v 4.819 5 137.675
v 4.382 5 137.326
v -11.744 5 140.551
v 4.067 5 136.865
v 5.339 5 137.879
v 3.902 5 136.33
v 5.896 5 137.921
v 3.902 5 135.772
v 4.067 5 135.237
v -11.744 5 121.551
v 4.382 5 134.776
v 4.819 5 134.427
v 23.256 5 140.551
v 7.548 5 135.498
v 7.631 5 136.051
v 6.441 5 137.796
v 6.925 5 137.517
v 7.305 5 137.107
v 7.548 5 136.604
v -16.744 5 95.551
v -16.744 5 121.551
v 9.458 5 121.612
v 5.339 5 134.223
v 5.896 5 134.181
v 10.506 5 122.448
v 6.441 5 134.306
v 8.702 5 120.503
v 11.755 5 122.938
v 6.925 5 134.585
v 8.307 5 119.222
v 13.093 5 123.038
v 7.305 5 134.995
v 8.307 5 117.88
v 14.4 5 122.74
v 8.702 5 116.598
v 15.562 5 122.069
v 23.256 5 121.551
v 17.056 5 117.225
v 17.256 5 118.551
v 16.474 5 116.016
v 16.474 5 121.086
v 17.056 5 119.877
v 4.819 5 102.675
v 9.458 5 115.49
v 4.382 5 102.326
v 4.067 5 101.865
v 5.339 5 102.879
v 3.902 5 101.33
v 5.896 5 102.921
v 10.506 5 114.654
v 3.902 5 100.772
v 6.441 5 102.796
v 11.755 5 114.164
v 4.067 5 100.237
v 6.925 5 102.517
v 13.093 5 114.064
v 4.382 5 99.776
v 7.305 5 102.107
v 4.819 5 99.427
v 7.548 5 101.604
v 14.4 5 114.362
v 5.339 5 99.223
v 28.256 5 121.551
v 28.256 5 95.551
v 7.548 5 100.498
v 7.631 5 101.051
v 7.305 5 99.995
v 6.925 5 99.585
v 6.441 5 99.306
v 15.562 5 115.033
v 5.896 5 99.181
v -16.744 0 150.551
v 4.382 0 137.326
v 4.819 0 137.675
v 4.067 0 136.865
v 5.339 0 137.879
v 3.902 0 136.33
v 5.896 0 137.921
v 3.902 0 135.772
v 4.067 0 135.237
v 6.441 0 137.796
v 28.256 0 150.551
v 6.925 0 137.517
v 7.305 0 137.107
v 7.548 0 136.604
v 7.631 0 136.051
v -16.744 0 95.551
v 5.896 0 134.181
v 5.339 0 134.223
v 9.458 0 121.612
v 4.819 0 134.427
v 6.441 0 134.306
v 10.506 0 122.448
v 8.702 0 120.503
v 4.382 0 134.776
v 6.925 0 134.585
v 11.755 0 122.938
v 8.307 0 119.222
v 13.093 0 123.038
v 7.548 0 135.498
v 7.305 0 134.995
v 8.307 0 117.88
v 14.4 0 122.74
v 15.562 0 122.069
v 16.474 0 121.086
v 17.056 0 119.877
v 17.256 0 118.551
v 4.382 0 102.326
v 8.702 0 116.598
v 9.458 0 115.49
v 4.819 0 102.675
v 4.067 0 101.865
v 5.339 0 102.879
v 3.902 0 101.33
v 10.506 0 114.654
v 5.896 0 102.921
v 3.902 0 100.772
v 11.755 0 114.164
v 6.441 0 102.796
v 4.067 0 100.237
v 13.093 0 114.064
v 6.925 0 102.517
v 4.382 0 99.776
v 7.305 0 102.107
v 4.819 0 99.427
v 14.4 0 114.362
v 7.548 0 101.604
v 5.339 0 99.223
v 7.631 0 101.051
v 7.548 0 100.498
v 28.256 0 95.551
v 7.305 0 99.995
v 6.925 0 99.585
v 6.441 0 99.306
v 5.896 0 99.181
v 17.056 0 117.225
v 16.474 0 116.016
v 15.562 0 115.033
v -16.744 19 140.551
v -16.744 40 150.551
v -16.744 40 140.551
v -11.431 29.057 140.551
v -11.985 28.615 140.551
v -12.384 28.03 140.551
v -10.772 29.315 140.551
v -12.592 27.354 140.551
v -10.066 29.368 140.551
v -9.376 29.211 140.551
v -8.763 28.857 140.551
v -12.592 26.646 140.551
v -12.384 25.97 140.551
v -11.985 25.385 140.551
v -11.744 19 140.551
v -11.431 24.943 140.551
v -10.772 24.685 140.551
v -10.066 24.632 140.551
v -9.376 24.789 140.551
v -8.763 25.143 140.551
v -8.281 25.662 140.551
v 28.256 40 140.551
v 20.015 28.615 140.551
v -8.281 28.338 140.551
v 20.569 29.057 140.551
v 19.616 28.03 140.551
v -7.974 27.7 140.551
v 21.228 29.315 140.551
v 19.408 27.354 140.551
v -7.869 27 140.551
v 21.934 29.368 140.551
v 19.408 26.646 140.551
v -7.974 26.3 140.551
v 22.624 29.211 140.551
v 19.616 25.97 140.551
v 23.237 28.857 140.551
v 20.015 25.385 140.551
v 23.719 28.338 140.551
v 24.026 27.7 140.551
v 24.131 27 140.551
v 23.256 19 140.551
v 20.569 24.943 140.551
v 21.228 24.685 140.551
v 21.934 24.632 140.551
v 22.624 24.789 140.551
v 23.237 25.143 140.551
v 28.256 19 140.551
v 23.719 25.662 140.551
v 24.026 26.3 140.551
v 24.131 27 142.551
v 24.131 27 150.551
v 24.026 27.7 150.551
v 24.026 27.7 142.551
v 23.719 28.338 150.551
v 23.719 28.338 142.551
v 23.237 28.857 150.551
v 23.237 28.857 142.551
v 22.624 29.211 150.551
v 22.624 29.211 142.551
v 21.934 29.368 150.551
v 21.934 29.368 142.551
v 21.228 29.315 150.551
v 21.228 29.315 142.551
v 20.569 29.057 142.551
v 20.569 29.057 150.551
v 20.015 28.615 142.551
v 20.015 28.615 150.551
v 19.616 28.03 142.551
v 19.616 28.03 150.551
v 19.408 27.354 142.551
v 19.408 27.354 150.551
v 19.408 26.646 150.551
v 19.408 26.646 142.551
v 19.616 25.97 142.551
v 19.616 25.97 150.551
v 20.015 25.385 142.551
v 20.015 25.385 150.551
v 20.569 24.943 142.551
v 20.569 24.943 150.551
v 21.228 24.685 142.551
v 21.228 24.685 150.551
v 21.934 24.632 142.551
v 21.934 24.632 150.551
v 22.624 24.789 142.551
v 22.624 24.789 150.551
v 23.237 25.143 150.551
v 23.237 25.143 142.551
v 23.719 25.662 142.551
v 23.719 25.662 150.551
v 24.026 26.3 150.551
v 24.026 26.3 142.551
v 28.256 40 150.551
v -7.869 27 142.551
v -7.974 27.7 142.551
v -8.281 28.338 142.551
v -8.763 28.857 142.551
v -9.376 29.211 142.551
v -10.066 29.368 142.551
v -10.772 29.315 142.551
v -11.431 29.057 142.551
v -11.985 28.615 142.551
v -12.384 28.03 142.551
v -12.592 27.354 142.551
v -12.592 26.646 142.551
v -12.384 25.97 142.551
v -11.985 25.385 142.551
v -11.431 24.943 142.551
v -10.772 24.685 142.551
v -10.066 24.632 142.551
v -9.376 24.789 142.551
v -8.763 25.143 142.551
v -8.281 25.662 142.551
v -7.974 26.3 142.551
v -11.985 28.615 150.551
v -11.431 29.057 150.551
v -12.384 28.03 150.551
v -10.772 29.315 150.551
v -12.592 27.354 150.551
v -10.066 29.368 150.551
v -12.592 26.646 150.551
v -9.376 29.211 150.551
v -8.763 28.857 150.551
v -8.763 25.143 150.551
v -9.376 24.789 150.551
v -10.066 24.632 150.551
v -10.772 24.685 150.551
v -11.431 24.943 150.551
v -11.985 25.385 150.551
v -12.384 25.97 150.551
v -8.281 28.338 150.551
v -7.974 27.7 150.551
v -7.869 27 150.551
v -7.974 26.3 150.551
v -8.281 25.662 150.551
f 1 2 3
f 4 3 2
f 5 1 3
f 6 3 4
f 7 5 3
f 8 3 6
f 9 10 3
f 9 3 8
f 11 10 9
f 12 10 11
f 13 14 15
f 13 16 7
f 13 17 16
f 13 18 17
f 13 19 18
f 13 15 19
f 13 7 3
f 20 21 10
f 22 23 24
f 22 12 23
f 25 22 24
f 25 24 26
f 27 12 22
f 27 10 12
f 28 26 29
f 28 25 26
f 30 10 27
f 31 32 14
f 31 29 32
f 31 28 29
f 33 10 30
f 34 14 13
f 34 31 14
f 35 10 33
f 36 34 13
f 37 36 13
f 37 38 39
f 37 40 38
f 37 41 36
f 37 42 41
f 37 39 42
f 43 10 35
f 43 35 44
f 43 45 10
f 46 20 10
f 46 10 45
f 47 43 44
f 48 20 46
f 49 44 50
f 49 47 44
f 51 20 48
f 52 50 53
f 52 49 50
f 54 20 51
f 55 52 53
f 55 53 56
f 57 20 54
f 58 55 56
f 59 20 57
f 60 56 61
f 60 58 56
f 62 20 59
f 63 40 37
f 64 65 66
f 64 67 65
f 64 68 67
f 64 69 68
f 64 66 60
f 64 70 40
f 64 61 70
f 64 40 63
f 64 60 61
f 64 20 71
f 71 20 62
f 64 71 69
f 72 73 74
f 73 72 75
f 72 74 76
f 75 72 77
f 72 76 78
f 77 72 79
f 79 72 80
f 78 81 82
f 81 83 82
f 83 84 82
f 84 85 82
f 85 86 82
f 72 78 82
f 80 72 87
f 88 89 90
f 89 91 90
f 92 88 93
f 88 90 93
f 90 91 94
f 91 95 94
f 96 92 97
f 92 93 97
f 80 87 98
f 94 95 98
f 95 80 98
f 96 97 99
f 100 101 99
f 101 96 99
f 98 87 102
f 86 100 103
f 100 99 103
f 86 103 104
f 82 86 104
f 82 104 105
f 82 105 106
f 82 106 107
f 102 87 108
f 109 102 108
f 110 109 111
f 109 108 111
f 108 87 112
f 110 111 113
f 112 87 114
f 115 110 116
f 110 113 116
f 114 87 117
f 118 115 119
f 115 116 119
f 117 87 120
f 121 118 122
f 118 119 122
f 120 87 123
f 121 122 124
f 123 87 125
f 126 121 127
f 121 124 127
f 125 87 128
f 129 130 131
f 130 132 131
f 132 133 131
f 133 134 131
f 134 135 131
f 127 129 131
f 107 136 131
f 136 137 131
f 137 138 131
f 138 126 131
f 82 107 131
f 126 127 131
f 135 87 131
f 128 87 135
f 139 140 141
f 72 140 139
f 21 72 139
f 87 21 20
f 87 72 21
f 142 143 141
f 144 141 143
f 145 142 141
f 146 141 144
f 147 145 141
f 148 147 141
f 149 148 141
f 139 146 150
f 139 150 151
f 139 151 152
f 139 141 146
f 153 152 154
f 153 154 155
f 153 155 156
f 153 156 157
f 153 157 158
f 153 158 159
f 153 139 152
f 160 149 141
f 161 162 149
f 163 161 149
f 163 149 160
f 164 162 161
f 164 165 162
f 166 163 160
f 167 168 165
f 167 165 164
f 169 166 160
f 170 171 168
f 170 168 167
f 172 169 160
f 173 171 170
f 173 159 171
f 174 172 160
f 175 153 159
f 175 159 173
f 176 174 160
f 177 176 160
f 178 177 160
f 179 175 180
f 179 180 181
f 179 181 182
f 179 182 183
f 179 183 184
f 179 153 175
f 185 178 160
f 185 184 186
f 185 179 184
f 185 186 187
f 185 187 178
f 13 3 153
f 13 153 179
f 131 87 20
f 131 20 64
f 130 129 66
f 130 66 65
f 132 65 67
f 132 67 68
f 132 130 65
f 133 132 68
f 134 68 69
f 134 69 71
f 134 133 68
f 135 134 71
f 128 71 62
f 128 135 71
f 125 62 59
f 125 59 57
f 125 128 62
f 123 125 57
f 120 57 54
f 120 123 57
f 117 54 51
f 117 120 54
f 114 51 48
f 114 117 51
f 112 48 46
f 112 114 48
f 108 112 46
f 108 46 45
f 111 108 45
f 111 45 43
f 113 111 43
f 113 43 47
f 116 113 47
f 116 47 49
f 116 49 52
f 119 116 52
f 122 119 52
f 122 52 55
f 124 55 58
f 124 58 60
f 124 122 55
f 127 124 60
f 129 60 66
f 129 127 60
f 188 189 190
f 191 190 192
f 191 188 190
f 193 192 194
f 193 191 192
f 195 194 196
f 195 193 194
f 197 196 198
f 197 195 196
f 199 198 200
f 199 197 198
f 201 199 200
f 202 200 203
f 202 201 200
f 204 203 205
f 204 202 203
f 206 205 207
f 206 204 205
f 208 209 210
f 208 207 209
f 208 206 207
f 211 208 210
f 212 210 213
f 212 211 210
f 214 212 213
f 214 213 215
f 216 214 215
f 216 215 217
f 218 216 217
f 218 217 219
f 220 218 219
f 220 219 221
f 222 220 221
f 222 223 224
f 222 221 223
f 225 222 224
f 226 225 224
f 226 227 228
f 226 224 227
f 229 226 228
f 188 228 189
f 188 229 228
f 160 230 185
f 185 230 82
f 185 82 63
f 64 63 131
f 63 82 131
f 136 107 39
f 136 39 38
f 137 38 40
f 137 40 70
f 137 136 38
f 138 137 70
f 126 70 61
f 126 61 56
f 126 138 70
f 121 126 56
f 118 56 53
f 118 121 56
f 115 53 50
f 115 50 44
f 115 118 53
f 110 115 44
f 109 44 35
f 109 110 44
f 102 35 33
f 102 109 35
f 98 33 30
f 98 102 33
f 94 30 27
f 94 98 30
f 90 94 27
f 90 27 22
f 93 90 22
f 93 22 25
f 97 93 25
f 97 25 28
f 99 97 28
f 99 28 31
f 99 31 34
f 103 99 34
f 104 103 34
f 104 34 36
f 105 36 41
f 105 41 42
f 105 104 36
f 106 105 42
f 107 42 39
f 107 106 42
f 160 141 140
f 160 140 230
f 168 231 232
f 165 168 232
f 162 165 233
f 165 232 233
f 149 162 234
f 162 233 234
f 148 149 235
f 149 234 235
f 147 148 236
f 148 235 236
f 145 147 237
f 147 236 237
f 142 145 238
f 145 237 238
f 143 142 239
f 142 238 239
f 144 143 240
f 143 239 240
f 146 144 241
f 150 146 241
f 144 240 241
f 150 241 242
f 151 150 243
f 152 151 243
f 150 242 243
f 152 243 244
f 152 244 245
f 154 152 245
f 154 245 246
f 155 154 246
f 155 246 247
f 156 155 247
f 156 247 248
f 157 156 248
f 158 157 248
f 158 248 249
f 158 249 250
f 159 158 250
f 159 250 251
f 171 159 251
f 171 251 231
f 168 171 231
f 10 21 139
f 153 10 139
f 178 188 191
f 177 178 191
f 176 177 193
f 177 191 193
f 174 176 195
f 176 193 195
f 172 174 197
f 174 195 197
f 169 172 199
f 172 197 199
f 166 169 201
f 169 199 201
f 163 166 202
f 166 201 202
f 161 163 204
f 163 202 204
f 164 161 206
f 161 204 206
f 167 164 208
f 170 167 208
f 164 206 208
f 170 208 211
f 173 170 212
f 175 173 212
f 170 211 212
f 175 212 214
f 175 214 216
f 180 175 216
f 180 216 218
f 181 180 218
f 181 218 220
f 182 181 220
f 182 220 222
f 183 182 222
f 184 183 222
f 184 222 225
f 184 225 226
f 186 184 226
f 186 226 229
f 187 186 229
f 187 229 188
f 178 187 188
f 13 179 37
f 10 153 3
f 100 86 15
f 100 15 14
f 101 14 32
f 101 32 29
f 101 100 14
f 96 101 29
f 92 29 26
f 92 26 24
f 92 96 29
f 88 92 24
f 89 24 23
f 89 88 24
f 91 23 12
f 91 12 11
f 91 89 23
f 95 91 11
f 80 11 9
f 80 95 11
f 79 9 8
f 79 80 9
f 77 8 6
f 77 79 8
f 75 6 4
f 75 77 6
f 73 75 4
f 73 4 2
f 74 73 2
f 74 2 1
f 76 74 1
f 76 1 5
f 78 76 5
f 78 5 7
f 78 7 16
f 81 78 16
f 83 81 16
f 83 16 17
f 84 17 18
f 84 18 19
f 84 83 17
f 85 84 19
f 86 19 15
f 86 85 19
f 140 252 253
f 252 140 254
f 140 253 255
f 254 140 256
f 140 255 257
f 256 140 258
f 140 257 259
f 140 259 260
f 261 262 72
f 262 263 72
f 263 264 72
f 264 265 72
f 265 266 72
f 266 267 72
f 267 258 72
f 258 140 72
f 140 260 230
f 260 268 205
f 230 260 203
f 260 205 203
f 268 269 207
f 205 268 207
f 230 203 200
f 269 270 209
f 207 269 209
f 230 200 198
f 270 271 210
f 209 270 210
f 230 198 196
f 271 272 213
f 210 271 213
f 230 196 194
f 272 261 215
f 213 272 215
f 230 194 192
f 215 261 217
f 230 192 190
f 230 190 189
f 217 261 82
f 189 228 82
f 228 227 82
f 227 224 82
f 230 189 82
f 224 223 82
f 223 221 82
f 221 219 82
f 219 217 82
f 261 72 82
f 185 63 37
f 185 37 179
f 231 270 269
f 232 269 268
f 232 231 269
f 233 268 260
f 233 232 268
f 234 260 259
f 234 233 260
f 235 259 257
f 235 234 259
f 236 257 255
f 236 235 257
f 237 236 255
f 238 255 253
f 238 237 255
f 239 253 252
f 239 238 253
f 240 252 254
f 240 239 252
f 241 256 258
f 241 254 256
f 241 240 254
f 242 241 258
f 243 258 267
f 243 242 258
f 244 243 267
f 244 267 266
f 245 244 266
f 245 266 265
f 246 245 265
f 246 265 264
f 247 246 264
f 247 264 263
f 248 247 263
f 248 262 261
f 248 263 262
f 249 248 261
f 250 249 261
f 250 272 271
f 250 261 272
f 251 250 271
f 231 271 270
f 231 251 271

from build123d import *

# Parameters (mm, degrees)
SKETCH7_W               = 45
SKETCH7_H               = 45
SKETCH7_R               = 1.875
SKETCH7_R_2             = 14
SKETCH7_R_3             = 4.5
BOSS_EXTRUDE5_DEPTH     = 5
SKETCH7_3_W             = 45
SKETCH7_3_H             = 2
BOSS_EXTRUDE6_DEPTH     = 40
BOSS_EXTRUDE7_DEPTH     = 5
SKETCH7_4_W             = 45
SKETCH7_4_H             = 8
BOSS_EXTRUDE8_DEPTH     = 40
SKETCH10_R              = 2.375
CUT_EXTRUDE2_DEPTH      = 9
CUT_EXTRUDE2_DEPTH_BACK = 5


with BuildPart() as part:
    # Sketch7 → Boss-Extrude5 (new body)
    with BuildSketch(Plane(origin=(0, 0, 0), x_dir=(1, 0, 0), z_dir=(0, 1, 0))):
        with Locations((5.756289545, -118.050969126)):
            Rectangle(SKETCH7_W, SKETCH7_H)
        with Locations((5.756289545, -136.050969126)):
            Circle(SKETCH7_R, mode=Mode.SUBTRACT)
        with Locations((5.362034713, -118.985312035)):
            Circle(SKETCH7_R_2, mode=Mode.SUBTRACT)
        with Locations((5.756289545, -101.050969126)):
            Circle(SKETCH7_R, mode=Mode.SUBTRACT)
        with Locations((5.362034713, -118.985312035)):
            Circle(SKETCH7_R_2)
        with Locations((12.756289545, -118.550969126)):
            Circle(SKETCH7_R_3, mode=Mode.SUBTRACT)
    extrude(amount=BOSS_EXTRUDE5_DEPTH)

    # Sketch7<3> → Boss-Extrude6 (add)
    with BuildSketch(Plane(origin=(0, 0, 0), x_dir=(1, 0, 0), z_dir=(0, 1, 0))):
        with Locations((5.756289545, -141.550969126)):
            Rectangle(SKETCH7_3_W, SKETCH7_3_H)
    extrude(amount=BOSS_EXTRUDE6_DEPTH)

    # Sketch8 → Boss-Extrude7 (add)
    with BuildSketch(Plane.ZY.offset(16.743710455)):
        Polygon((140.550969126, 11), (140.550969126, 5), (121.550969126, 5), (140.550969126, 19), align=None)
    boss_extrude7 = extrude(amount=-BOSS_EXTRUDE7_DEPTH)

    # Mirror2: Boss-Extrude7 across plane
    add(boss_extrude7.mirror(Plane.ZY.offset(-5.756289545)))

    # Sketch7<4> → Boss-Extrude8 (add)
    with BuildSketch(Plane(origin=(0, 0, 0), x_dir=(1, 0, 0), z_dir=(0, 1, 0))):
        with Locations((5.756289545, -146.550969126)):
            Rectangle(SKETCH7_4_W, SKETCH7_4_H)
    extrude(amount=BOSS_EXTRUDE8_DEPTH)

    # Sketch10 → Cut-Extrude2 (cut, two sides)
    with BuildSketch(Plane.XY.offset(142.550969126)) as cut_extrude2_sk:
        with Locations((21.756289545, 27)):
            Circle(SKETCH10_R)
        with Locations((-10.243710455, 27)):
            Circle(SKETCH10_R)
    extrude(amount=CUT_EXTRUDE2_DEPTH, mode=Mode.SUBTRACT)
    extrude(cut_extrude2_sk.sketch, amount=-CUT_EXTRUDE2_DEPTH_BACK, mode=Mode.SUBTRACT)


solid = part.part
